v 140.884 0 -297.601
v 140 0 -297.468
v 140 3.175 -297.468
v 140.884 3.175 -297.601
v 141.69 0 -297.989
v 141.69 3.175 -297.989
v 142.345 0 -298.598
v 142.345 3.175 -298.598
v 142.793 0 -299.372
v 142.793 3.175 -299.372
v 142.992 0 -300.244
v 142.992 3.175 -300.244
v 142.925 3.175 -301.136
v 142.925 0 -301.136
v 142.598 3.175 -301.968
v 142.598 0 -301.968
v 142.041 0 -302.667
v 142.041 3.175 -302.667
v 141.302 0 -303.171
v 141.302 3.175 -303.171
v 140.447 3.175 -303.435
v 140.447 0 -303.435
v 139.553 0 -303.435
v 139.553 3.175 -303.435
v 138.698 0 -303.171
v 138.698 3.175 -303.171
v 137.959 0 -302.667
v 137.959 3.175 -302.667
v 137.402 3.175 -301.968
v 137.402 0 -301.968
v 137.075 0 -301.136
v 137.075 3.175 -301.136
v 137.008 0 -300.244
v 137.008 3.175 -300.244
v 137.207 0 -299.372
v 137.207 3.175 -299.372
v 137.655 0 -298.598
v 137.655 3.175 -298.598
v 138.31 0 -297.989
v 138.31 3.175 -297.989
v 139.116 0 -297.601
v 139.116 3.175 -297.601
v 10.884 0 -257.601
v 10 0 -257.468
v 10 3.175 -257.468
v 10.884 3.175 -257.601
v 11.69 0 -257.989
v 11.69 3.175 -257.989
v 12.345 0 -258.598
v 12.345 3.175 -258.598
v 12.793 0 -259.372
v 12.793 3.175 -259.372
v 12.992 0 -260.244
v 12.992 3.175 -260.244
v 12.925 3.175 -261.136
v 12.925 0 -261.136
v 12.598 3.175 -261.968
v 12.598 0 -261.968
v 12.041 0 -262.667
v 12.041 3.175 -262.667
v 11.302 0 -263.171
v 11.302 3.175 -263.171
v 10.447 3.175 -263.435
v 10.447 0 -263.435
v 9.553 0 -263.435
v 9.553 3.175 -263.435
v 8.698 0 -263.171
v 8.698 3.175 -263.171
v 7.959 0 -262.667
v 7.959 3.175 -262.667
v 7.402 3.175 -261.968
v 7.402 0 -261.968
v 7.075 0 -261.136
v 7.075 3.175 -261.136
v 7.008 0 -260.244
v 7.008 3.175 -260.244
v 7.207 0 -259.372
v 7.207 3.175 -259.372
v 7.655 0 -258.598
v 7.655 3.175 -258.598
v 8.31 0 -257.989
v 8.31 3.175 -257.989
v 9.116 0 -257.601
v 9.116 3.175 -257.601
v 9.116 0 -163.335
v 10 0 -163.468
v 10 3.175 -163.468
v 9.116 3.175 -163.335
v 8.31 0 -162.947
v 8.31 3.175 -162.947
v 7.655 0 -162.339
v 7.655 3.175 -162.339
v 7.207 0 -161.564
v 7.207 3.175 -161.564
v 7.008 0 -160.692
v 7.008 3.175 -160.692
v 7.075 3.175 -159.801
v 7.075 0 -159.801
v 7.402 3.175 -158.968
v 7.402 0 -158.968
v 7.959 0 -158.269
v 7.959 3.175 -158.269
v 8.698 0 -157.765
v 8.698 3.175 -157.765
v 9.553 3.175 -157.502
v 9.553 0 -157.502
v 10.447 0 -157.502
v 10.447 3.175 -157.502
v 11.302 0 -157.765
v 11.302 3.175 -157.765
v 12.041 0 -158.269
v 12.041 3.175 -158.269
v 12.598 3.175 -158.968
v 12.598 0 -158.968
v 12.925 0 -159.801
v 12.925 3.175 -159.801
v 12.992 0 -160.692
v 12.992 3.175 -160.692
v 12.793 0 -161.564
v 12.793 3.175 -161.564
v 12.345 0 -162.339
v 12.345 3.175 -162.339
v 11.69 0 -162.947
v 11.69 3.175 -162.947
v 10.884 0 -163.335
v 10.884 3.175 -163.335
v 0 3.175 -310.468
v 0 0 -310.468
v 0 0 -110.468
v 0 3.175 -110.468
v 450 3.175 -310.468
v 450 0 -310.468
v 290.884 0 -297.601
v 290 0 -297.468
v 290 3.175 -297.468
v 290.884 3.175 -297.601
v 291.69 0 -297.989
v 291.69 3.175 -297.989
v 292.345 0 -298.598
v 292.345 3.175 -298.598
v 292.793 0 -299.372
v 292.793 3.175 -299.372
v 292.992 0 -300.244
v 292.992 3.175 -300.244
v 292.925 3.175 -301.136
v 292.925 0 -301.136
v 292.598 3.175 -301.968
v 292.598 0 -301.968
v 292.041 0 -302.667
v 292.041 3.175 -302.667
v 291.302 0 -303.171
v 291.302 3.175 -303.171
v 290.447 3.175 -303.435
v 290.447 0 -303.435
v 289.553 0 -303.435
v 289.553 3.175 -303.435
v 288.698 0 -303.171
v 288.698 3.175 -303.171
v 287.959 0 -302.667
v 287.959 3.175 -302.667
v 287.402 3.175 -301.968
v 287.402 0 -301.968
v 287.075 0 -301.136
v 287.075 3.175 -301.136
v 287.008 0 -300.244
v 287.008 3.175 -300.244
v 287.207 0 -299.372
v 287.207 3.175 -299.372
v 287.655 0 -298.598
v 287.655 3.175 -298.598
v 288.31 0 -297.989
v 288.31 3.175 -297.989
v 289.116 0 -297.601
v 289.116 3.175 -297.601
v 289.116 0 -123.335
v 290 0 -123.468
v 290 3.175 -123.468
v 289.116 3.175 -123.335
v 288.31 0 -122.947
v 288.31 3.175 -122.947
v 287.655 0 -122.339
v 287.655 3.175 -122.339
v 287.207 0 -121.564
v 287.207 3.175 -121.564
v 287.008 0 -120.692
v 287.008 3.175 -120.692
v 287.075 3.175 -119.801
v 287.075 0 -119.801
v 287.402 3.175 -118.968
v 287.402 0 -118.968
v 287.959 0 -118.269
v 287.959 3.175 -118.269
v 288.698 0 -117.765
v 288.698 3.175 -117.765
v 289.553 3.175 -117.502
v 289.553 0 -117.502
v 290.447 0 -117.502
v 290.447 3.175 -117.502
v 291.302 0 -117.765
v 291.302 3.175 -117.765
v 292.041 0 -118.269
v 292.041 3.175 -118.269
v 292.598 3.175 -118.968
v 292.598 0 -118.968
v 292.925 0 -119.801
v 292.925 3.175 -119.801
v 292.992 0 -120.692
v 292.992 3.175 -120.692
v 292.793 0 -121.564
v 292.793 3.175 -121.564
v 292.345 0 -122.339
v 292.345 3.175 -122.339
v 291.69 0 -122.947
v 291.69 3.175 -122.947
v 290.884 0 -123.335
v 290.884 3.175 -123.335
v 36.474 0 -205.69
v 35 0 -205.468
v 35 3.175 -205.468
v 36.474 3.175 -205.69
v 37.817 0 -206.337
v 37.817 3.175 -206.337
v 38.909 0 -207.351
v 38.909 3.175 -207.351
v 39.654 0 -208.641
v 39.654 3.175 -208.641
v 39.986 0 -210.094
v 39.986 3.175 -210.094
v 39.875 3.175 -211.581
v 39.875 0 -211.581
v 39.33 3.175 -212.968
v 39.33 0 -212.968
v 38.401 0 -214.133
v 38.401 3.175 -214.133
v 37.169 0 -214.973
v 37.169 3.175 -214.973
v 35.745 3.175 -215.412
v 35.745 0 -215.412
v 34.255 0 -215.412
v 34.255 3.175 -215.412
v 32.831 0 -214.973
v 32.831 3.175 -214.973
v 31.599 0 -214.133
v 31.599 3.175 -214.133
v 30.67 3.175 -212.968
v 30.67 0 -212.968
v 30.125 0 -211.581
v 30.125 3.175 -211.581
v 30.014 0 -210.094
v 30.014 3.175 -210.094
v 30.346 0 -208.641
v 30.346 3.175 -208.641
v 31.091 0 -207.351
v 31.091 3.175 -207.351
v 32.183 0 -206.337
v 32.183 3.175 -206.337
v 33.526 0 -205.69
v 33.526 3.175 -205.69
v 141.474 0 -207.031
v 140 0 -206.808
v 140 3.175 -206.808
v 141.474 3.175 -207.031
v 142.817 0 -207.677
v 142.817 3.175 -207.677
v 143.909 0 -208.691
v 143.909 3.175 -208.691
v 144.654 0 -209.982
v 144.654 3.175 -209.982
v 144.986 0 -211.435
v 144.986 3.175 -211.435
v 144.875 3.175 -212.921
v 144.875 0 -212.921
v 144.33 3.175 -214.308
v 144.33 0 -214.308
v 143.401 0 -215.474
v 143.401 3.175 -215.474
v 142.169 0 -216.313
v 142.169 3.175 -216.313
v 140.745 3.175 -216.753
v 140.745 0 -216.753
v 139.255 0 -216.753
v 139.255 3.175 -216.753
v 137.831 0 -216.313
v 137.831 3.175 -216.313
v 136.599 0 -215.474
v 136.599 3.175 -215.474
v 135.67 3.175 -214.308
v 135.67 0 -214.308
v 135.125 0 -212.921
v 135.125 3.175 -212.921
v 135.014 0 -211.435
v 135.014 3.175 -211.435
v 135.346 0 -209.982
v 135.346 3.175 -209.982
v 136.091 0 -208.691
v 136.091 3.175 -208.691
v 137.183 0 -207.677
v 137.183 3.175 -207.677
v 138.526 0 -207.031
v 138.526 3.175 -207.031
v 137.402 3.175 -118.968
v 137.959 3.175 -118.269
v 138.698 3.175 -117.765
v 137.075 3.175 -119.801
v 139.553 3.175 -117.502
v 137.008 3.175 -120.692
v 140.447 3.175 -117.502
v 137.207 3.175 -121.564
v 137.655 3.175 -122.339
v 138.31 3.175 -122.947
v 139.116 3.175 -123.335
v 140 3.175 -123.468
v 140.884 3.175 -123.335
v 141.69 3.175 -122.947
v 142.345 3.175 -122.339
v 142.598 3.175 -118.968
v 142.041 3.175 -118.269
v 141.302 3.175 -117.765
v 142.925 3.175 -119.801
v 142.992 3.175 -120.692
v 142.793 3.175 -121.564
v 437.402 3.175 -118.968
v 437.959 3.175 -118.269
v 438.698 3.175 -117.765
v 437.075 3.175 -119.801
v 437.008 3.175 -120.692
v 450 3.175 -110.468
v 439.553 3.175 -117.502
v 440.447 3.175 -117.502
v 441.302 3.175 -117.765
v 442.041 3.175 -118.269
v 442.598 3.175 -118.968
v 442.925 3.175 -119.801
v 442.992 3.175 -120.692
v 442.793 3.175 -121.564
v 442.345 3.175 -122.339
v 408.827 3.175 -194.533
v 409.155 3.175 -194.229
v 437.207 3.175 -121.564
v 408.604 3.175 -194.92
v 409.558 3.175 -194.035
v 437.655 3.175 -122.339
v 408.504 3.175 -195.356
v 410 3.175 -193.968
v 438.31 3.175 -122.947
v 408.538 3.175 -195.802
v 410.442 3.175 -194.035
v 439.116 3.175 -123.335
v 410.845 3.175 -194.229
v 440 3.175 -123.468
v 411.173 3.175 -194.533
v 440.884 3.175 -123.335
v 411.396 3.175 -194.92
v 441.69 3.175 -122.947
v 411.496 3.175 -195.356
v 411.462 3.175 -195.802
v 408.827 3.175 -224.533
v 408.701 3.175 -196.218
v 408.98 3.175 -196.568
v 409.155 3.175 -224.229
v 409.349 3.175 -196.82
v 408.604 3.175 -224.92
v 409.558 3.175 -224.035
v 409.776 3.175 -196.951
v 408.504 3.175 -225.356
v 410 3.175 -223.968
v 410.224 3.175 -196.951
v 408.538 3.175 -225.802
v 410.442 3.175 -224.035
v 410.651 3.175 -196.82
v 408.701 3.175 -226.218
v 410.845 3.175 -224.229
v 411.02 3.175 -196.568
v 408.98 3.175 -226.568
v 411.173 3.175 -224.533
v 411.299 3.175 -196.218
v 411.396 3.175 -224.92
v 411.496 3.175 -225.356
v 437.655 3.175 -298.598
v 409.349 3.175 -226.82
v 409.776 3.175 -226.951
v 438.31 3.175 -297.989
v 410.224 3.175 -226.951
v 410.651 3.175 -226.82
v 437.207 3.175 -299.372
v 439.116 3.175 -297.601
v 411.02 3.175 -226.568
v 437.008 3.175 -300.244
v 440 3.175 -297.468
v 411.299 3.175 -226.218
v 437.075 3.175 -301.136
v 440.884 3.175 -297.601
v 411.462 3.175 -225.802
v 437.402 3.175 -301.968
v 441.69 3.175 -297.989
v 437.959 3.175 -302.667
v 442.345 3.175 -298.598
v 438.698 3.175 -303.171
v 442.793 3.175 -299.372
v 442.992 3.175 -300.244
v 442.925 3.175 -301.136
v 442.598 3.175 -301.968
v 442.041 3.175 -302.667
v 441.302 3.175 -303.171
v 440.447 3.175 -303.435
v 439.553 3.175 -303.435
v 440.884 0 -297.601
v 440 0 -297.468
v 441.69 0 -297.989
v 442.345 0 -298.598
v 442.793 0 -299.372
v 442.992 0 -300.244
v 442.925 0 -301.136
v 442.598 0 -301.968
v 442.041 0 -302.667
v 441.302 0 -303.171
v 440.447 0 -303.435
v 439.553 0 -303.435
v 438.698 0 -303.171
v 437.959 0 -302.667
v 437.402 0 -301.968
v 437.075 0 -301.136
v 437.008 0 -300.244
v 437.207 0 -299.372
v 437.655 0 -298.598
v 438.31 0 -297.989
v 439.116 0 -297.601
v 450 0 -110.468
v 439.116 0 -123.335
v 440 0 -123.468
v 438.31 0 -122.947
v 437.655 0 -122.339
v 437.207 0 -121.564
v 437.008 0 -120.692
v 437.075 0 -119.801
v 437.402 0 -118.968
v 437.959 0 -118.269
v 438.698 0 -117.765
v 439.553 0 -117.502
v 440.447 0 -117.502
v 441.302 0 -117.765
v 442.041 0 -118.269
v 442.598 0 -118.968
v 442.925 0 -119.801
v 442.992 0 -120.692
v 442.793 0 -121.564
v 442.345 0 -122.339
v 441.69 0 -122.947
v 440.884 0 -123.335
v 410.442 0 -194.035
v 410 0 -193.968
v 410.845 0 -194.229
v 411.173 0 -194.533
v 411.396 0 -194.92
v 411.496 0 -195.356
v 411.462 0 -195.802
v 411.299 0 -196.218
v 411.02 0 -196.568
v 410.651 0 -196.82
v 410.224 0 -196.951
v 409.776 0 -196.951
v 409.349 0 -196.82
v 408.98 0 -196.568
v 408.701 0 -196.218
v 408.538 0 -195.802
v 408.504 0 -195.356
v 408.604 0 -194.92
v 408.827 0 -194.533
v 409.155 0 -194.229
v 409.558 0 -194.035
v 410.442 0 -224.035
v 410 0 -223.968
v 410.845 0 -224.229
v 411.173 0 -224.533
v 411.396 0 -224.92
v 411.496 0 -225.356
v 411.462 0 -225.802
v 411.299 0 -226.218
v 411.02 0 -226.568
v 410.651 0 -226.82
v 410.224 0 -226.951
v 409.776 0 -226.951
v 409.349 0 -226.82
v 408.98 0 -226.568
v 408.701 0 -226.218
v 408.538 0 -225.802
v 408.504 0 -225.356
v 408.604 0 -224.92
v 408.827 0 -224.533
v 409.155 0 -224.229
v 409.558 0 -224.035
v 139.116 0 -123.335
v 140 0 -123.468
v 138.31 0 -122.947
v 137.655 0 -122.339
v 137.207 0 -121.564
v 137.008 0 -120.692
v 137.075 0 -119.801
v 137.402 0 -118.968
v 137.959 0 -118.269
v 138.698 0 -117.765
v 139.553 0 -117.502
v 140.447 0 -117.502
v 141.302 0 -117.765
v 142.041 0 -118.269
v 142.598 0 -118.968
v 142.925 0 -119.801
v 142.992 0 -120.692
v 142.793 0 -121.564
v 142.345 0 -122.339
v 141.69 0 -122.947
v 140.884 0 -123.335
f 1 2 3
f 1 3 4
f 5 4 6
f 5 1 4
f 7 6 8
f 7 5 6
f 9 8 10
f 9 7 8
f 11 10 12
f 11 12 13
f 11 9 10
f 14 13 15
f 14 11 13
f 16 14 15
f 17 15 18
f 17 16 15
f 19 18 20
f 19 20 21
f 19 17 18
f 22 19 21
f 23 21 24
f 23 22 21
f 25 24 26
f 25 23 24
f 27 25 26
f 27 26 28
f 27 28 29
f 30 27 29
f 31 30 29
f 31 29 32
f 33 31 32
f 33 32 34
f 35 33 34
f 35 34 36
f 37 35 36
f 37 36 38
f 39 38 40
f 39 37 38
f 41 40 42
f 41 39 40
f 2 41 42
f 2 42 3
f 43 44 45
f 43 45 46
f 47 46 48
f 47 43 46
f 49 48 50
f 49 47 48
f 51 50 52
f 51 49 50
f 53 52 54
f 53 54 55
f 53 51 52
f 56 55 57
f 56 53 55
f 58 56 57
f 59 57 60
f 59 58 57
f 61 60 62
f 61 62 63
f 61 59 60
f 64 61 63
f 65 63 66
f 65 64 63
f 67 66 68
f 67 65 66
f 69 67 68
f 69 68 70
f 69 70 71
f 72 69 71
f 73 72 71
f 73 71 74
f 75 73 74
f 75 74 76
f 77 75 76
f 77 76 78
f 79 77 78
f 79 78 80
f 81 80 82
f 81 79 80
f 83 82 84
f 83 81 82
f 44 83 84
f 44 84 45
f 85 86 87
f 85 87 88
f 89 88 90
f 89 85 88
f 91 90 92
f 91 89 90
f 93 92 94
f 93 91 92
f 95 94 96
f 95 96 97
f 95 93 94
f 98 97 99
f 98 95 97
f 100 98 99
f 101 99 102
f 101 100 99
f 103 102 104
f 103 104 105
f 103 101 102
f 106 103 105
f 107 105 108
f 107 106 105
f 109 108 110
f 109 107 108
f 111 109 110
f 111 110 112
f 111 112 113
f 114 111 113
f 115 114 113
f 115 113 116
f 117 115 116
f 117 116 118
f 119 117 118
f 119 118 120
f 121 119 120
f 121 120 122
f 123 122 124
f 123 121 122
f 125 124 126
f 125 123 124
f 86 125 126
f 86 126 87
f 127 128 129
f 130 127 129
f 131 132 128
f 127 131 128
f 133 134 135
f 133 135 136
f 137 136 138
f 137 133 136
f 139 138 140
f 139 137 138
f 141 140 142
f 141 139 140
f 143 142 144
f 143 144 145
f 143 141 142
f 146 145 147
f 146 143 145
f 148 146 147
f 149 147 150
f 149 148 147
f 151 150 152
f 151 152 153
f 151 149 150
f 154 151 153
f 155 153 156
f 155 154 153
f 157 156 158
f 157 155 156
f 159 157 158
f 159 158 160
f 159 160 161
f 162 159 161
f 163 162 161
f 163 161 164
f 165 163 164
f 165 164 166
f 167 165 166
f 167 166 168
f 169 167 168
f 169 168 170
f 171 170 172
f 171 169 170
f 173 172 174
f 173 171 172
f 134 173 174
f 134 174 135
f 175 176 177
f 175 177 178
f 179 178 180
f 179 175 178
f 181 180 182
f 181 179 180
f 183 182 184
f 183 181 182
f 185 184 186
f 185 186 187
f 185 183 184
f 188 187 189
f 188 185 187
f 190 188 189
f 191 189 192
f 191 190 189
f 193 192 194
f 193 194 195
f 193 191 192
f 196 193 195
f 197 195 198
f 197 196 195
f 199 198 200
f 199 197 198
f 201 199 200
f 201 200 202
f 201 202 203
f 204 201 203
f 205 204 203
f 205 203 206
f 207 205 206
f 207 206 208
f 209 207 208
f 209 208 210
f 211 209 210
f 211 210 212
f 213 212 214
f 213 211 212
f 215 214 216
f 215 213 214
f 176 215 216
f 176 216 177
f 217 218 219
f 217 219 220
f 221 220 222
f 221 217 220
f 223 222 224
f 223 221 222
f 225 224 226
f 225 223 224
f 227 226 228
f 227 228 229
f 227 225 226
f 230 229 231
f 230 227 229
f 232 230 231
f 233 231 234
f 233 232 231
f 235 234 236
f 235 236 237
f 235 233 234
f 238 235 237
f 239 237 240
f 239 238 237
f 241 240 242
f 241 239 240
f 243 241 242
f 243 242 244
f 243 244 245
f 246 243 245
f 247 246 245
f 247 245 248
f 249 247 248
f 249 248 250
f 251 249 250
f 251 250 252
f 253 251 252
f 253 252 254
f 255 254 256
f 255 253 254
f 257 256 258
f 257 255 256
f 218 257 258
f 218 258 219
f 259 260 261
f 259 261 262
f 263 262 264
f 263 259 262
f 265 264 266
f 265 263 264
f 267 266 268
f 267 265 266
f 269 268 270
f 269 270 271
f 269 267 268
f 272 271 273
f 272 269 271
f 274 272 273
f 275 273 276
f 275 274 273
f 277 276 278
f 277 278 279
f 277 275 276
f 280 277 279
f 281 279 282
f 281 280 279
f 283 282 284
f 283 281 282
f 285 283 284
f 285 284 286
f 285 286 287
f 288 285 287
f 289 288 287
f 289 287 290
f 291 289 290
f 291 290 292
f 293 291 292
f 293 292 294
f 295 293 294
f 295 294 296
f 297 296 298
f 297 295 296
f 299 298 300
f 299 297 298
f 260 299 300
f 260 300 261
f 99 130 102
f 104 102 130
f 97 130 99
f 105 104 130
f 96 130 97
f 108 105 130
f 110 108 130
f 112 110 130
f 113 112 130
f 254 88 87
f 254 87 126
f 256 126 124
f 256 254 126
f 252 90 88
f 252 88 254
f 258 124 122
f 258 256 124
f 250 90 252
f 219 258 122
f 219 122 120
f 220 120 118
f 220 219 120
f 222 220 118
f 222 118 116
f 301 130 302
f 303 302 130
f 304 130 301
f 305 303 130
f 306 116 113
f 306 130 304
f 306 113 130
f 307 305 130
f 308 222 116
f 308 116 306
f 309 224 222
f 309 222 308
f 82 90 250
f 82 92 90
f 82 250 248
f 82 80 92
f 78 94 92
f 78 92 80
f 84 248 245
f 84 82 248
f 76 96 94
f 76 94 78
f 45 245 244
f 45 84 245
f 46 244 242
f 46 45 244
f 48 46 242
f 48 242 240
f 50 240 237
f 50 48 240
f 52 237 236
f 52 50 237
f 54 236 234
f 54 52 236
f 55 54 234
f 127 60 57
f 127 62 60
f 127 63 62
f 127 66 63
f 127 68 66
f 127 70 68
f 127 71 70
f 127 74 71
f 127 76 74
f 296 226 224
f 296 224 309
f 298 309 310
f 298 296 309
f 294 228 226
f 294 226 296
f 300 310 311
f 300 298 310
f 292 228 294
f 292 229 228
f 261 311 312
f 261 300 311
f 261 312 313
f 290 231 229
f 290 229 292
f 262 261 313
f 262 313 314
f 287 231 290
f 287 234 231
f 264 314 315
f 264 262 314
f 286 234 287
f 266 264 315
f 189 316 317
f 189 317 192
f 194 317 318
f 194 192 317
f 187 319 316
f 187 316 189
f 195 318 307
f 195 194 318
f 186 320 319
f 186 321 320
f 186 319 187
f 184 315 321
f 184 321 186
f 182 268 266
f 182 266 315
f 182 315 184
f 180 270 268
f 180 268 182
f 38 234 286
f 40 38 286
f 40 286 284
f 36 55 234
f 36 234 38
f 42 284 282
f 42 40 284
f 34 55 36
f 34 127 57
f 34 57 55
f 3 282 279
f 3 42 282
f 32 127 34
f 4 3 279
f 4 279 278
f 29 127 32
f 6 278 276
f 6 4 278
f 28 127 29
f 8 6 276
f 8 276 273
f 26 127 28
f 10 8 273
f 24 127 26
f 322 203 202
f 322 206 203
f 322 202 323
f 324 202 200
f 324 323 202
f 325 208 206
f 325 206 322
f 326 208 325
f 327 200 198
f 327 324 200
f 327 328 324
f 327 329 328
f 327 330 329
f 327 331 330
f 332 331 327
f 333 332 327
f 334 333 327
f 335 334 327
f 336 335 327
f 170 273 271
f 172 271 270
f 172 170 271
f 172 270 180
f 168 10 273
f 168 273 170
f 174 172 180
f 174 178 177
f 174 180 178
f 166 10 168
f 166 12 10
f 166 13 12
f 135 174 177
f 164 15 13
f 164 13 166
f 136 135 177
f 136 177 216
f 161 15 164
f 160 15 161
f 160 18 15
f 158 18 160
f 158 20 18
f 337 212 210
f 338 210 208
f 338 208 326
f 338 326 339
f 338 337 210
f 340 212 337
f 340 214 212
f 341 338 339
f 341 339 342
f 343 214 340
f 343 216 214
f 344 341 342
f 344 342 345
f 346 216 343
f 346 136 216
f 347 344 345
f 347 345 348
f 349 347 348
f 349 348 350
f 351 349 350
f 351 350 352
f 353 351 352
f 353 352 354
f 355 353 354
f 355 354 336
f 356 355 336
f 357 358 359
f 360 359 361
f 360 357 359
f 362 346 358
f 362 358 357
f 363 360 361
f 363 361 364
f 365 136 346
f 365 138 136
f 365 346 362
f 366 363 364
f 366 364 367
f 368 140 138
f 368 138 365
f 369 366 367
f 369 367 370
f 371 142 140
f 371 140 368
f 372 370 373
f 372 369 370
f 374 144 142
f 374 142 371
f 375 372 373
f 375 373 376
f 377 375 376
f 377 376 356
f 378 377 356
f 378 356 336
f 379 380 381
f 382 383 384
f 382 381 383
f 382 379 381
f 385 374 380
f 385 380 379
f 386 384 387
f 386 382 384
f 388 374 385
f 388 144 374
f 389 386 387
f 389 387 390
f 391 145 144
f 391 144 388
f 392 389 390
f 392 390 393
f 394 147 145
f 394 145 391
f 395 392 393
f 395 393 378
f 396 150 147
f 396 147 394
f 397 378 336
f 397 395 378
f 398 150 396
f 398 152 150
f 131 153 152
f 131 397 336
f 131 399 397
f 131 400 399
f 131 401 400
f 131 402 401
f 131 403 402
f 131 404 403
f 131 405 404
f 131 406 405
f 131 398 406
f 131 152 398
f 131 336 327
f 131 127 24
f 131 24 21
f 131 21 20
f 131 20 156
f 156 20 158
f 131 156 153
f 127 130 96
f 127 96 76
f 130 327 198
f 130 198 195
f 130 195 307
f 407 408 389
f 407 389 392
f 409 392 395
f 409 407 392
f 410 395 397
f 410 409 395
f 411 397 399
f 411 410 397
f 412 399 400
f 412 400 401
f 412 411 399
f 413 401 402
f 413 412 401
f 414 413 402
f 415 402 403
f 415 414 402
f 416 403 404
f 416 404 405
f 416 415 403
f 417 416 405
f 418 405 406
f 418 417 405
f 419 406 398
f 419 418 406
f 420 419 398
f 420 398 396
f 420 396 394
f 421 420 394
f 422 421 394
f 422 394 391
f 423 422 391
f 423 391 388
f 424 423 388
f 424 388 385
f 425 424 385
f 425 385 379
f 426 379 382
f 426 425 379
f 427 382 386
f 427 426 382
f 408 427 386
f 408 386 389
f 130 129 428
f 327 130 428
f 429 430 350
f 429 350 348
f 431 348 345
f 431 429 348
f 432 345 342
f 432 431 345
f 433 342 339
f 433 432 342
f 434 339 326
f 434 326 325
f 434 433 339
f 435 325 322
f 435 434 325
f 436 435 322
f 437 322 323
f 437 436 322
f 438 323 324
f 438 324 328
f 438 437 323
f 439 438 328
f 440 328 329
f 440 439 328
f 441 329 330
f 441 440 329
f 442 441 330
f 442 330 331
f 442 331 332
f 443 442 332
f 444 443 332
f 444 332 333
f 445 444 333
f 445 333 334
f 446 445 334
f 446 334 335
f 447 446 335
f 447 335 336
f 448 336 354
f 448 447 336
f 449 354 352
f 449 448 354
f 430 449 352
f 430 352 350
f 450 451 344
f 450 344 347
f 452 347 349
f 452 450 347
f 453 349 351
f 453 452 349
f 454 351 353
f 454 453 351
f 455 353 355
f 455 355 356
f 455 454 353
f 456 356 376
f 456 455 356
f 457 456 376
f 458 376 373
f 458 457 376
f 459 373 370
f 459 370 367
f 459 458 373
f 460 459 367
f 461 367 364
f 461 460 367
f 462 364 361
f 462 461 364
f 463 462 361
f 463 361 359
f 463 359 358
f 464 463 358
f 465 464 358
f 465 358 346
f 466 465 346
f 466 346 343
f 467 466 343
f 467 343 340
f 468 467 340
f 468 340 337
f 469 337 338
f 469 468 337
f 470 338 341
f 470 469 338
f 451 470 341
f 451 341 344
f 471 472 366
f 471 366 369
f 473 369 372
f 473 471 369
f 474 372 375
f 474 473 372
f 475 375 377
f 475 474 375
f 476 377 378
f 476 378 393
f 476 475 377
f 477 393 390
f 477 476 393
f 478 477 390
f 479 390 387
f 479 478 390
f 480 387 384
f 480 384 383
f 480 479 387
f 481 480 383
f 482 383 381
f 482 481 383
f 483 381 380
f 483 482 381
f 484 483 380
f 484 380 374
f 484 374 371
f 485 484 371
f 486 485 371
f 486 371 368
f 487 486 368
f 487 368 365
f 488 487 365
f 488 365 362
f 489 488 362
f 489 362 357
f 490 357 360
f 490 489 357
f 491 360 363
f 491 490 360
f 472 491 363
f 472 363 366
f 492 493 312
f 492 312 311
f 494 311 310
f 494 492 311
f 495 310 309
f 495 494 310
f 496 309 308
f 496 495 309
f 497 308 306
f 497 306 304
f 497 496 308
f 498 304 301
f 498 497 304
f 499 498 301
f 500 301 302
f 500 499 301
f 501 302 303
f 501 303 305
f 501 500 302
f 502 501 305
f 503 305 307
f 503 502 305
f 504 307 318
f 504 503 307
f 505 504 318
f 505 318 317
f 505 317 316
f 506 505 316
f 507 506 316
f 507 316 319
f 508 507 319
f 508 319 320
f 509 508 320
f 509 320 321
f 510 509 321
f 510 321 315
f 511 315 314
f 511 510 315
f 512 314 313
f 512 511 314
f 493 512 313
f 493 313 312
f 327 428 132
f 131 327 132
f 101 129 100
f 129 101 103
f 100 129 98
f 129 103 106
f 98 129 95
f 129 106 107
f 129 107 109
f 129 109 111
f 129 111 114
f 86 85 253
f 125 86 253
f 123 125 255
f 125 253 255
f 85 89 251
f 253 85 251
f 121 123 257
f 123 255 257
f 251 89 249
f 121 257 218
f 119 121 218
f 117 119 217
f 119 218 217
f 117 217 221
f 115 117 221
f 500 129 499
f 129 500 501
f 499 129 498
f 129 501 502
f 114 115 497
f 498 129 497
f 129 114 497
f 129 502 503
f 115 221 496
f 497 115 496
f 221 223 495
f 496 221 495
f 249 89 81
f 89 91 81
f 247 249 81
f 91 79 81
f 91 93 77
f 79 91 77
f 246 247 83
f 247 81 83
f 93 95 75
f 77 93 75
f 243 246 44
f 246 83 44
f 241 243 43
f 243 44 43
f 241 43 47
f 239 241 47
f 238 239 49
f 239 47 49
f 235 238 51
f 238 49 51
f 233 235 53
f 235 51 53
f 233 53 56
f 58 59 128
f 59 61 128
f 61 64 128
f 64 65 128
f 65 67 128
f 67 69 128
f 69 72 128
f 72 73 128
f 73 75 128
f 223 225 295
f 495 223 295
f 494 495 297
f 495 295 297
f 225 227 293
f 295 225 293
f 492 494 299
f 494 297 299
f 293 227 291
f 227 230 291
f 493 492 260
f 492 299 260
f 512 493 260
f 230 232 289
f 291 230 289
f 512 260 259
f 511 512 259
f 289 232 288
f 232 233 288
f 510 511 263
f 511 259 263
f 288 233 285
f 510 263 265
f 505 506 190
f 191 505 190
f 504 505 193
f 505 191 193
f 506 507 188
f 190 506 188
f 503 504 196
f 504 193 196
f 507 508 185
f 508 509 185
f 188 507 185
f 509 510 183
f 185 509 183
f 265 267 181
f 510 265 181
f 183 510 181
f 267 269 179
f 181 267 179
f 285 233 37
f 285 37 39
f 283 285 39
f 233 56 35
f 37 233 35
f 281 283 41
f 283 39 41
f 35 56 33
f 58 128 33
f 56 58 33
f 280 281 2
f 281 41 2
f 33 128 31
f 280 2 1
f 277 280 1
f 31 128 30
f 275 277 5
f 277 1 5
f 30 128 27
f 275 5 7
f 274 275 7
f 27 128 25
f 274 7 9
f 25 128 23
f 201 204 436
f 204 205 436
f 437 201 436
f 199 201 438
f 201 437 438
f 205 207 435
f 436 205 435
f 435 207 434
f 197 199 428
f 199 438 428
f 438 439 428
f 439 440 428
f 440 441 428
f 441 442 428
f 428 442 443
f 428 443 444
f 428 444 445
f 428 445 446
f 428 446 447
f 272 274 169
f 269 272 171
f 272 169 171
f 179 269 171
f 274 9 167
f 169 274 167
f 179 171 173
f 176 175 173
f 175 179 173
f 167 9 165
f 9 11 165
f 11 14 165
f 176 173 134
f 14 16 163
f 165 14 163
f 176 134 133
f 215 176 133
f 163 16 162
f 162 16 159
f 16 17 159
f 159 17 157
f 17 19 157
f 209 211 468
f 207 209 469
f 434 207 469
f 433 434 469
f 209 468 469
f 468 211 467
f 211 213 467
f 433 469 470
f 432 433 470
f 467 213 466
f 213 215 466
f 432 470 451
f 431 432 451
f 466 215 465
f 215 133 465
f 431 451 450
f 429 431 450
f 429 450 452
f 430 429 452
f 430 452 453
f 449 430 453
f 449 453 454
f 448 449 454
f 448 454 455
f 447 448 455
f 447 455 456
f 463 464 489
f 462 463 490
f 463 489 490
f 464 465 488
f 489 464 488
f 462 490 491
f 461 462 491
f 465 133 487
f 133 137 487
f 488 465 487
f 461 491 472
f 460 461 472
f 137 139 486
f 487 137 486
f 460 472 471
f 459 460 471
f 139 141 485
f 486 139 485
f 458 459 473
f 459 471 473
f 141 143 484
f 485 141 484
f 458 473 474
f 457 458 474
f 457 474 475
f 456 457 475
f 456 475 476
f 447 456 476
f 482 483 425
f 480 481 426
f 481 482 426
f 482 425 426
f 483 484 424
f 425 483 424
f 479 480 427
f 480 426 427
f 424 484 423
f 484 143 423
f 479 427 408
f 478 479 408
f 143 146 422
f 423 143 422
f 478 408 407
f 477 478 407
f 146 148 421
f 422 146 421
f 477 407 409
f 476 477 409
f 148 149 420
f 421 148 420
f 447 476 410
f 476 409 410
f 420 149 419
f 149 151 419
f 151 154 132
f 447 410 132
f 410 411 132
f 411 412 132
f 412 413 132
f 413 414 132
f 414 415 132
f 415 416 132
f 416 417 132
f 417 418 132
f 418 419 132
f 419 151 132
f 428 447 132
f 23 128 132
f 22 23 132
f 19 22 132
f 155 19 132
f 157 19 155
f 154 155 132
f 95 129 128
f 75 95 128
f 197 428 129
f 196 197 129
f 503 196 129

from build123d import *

# Parameters (mm, degrees)
SKETCH1_R           = 1.5
SKETCH1_R_2         = 3
SKETCH1_R_3         = 5
BOSS_EXTRUDE1_DEPTH = 3.175


with BuildPart() as part:
    # Sketch1 → Boss-Extrude1 (new body)
    with BuildSketch(Plane(origin=(0, 0, 0), x_dir=(1, 0, 0), z_dir=(0, 1, 0))):
        Polygon((70, 110.468098835), (450, 110.468098835), (450, 310.468098835), (70, 310.468098835), (0, 310.468098835), (0, 110.468098835), align=None)
        with Locations(Location((410, 225.468098835, 0), (0, 0, 270))):
            Circle(SKETCH1_R, mode=Mode.SUBTRACT)
        with Locations(Location((410, 195.468098835, 0), (0, 0, 270))):
            Circle(SKETCH1_R, mode=Mode.SUBTRACT)
        with Locations(Location((10, 260.468098835, 0), (0, 0, 270))):
            Circle(SKETCH1_R_2, mode=Mode.SUBTRACT)
        with Locations(Location((440, 300.468098835, 0), (0, 0, 270))):
            Circle(SKETCH1_R_2, mode=Mode.SUBTRACT)
        with Locations(Location((140, 300.468098835, 0), (0, 0, 270))):
            Circle(SKETCH1_R_2, mode=Mode.SUBTRACT)
        with Locations(Location((290, 300.468098835, 0), (0, 0, 270))):
            Circle(SKETCH1_R_2, mode=Mode.SUBTRACT)
        with Locations(Location((440, 120.468098835, 0), (0, 0, 90))):
            Circle(SKETCH1_R_2, mode=Mode.SUBTRACT)
        with Locations(Location((290, 120.468098835, 0), (0, 0, 90))):
            Circle(SKETCH1_R_2, mode=Mode.SUBTRACT)
        with Locations(Location((140, 120.468098835, 0), (0, 0, 90))):
            Circle(SKETCH1_R_2, mode=Mode.SUBTRACT)
        with Locations(Location((10, 160.468098835, 0), (0, 0, 90))):
            Circle(SKETCH1_R_2, mode=Mode.SUBTRACT)
        with Locations(Location((35, 210.468098835, 0), (0, 0, 270))):
            Circle(SKETCH1_R_3, mode=Mode.SUBTRACT)
        with Locations(Location((140, 211.808399399, 0), (0, 0, 270))):
            Circle(SKETCH1_R_3, mode=Mode.SUBTRACT)
    extrude(amount=BOSS_EXTRUDE1_DEPTH)


solid = part.part
